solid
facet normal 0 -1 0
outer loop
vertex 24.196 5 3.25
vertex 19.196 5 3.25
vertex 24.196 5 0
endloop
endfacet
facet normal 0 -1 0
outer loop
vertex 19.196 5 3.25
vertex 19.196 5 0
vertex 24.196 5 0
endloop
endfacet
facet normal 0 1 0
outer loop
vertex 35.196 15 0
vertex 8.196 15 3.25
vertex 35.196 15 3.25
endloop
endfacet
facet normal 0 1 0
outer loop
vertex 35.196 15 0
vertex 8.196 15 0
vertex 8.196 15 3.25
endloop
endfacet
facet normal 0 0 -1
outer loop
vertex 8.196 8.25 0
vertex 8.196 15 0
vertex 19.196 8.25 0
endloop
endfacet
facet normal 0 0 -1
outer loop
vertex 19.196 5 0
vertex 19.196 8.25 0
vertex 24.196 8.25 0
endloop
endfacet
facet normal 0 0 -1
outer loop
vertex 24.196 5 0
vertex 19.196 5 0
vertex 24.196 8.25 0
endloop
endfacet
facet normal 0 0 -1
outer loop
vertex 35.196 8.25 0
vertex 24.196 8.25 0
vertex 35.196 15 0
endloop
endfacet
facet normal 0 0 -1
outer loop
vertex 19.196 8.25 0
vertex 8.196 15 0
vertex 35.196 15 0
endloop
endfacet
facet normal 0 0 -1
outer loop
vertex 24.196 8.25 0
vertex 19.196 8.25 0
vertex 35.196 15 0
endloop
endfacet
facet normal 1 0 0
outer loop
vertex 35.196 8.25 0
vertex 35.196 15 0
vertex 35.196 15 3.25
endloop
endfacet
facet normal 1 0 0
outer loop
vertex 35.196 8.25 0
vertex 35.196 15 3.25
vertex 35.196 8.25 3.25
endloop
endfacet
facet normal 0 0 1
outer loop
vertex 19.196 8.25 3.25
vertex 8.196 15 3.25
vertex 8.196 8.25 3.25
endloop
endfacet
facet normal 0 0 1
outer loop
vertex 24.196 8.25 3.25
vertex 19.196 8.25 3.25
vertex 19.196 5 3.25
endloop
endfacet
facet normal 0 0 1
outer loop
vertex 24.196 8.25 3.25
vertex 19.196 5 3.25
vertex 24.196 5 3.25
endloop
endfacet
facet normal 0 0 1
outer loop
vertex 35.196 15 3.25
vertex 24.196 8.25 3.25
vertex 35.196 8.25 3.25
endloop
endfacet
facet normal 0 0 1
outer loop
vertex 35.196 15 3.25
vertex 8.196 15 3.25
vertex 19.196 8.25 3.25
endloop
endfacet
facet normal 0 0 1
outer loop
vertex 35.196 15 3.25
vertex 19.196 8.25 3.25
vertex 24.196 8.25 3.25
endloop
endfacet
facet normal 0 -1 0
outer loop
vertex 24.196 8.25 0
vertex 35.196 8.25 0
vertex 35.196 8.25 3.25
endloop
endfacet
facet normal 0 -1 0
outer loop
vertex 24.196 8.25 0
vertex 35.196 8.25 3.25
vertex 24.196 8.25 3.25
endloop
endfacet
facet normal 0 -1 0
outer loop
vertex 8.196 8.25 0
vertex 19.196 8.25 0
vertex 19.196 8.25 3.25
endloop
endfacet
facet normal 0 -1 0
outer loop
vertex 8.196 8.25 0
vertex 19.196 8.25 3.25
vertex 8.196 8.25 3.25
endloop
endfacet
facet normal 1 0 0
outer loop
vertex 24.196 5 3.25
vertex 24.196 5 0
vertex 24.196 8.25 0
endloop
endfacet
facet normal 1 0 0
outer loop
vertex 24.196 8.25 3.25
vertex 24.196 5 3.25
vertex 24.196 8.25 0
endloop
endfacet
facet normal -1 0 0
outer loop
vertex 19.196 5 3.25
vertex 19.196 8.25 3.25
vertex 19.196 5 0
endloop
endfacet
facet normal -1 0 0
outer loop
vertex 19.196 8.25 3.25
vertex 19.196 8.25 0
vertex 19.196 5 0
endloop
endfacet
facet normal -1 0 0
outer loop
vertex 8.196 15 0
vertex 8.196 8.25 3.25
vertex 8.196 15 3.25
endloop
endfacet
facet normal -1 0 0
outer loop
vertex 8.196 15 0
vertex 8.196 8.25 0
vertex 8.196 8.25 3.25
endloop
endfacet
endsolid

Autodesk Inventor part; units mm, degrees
ref_plane "YZ Plane" through (0, 0, 0) normal (1, 0, 0) x (0, 1, 0)
ref_plane "XZ Plane" through (0, 0, 0) normal (0, 1, 0) x (-1, 0, 0)
ref_plane "XY Plane" through (0, 0, 0) normal (0, 0, 1) x (1, 0, 0)
sketch "Block1" plane through (0, 0, 0) normal (0, 0, 1) x (1, 0, 0)
  circle A0 centre (74.029, 24.2723) radius 1
  line L0 (49.279, 30.4723) -> (71.779, 30.4723)
  line L1 (71.779, 30.4723) -> (71.779, 18.0723)
  line L2 (71.779, 18.0723) -> (49.279, 18.0723)
  line L3 (49.279, 18.0723) -> (49.279, 30.4723)
  line L4 (49.279, 30.4723) -> (44.779, 30.4723)
  line L5 (44.779, 30.4723) -> (44.779, 18.0723)
  line L6 (44.779, 18.0723) -> (49.279, 18.0723)
  line L7 (49.279, 18.0723) -> (49.279, 30.4723)
  line L8 (71.779, 30.4723) -> (76.279, 30.4723)
  line L9 (76.279, 30.4723) -> (76.279, 18.0723)
  line L10 (76.279, 18.0723) -> (71.779, 18.0723)
  line L11 (71.779, 18.0723) -> (71.779, 30.4723)
  line L12 (44.779, 24.2723) -> (76.279, 24.2723) construction
  line L13 (47.029, 30.4723) -> (47.029, 18.0723) construction
  circle A1 centre (47.029, 24.2723) radius 1
  line L14 (74.029, 30.4723) -> (74.029, 18.0723) construction
  point P0 (60.979, 24.0984)
  dimension "d7" = 22.5
  dimension "d8" = 12.4
  dimension "d9" = 4.5
  dimension "d10" = 4.5
  dimension "d11" = 2
  dimension "d12" = 2
sketch "Sketch1" plane through (0, 0, 0) normal (0, 0, 1) x (1, 0, 0)
  line L0 (-92.7646, -8.503) -> (-89.7646, -8.503)
  line L1 (-89.7646, -8.503) -> (-89.7646, -11.753)
  line L2 (-89.7646, -11.753) -> (-92.7646, -11.753)
  line L3 (-92.7646, -11.753) -> (-92.7646, -8.503)
  line L4 (-92.7646, -21.6527) -> (-89.7646, -21.6527)
  line L5 (-89.7646, -21.6527) -> (-89.7646, -21.7527)
  line L6 (-89.7646, -21.7527) -> (-92.7646, -21.7527)
  line L7 (-92.7646, -21.7527) -> (-92.7646, -21.6527)
  line L8 (8.196, 15.0005) -> (35.196, 15.0005)
  line L9 (35.196, 15.0005) -> (35.196, 8.2505)
  line L10 (35.196, 8.2505) -> (8.196, 8.2505)
  line L11 (8.196, 8.2505) -> (8.196, 15.0005)
  line L12 (8.196, 11.6255) -> (35.196, 11.6255) construction
  line L13 (21.696, 15.0005) -> (21.696, 8.2505) construction
  line L14 (19.196, 5.0005) -> (24.196, 5.0005)
  line L15 (24.196, 5.0005) -> (24.196, 8.2505)
  line L16 (24.196, 8.2505) -> (19.196, 8.2505)
  line L17 (19.196, 8.2505) -> (19.196, 5.0005)
  line L18 (21.696, 8.2505) -> (21.696, 5.0005) construction
  point P0 (0, 0)
  dimension "d0" = 3
  dimension "mat" = 3.25
  dimension "d2" = 3
  dimension "d3" = 0.1
  dimension "d59" = 27
  dimension "d60" = 6.75
  dimension "d61" = 5
  dimension "d62" = 3.25
extrude "Extrusion6" add sketch "Sketch1" along normal blind 3.25 contours L8 L9 L10 L11 | L10 L15 L14 L17
equation "\"d62\" = mat"
equation "\"d65\" = mat"
properties part number "arm-servo"
